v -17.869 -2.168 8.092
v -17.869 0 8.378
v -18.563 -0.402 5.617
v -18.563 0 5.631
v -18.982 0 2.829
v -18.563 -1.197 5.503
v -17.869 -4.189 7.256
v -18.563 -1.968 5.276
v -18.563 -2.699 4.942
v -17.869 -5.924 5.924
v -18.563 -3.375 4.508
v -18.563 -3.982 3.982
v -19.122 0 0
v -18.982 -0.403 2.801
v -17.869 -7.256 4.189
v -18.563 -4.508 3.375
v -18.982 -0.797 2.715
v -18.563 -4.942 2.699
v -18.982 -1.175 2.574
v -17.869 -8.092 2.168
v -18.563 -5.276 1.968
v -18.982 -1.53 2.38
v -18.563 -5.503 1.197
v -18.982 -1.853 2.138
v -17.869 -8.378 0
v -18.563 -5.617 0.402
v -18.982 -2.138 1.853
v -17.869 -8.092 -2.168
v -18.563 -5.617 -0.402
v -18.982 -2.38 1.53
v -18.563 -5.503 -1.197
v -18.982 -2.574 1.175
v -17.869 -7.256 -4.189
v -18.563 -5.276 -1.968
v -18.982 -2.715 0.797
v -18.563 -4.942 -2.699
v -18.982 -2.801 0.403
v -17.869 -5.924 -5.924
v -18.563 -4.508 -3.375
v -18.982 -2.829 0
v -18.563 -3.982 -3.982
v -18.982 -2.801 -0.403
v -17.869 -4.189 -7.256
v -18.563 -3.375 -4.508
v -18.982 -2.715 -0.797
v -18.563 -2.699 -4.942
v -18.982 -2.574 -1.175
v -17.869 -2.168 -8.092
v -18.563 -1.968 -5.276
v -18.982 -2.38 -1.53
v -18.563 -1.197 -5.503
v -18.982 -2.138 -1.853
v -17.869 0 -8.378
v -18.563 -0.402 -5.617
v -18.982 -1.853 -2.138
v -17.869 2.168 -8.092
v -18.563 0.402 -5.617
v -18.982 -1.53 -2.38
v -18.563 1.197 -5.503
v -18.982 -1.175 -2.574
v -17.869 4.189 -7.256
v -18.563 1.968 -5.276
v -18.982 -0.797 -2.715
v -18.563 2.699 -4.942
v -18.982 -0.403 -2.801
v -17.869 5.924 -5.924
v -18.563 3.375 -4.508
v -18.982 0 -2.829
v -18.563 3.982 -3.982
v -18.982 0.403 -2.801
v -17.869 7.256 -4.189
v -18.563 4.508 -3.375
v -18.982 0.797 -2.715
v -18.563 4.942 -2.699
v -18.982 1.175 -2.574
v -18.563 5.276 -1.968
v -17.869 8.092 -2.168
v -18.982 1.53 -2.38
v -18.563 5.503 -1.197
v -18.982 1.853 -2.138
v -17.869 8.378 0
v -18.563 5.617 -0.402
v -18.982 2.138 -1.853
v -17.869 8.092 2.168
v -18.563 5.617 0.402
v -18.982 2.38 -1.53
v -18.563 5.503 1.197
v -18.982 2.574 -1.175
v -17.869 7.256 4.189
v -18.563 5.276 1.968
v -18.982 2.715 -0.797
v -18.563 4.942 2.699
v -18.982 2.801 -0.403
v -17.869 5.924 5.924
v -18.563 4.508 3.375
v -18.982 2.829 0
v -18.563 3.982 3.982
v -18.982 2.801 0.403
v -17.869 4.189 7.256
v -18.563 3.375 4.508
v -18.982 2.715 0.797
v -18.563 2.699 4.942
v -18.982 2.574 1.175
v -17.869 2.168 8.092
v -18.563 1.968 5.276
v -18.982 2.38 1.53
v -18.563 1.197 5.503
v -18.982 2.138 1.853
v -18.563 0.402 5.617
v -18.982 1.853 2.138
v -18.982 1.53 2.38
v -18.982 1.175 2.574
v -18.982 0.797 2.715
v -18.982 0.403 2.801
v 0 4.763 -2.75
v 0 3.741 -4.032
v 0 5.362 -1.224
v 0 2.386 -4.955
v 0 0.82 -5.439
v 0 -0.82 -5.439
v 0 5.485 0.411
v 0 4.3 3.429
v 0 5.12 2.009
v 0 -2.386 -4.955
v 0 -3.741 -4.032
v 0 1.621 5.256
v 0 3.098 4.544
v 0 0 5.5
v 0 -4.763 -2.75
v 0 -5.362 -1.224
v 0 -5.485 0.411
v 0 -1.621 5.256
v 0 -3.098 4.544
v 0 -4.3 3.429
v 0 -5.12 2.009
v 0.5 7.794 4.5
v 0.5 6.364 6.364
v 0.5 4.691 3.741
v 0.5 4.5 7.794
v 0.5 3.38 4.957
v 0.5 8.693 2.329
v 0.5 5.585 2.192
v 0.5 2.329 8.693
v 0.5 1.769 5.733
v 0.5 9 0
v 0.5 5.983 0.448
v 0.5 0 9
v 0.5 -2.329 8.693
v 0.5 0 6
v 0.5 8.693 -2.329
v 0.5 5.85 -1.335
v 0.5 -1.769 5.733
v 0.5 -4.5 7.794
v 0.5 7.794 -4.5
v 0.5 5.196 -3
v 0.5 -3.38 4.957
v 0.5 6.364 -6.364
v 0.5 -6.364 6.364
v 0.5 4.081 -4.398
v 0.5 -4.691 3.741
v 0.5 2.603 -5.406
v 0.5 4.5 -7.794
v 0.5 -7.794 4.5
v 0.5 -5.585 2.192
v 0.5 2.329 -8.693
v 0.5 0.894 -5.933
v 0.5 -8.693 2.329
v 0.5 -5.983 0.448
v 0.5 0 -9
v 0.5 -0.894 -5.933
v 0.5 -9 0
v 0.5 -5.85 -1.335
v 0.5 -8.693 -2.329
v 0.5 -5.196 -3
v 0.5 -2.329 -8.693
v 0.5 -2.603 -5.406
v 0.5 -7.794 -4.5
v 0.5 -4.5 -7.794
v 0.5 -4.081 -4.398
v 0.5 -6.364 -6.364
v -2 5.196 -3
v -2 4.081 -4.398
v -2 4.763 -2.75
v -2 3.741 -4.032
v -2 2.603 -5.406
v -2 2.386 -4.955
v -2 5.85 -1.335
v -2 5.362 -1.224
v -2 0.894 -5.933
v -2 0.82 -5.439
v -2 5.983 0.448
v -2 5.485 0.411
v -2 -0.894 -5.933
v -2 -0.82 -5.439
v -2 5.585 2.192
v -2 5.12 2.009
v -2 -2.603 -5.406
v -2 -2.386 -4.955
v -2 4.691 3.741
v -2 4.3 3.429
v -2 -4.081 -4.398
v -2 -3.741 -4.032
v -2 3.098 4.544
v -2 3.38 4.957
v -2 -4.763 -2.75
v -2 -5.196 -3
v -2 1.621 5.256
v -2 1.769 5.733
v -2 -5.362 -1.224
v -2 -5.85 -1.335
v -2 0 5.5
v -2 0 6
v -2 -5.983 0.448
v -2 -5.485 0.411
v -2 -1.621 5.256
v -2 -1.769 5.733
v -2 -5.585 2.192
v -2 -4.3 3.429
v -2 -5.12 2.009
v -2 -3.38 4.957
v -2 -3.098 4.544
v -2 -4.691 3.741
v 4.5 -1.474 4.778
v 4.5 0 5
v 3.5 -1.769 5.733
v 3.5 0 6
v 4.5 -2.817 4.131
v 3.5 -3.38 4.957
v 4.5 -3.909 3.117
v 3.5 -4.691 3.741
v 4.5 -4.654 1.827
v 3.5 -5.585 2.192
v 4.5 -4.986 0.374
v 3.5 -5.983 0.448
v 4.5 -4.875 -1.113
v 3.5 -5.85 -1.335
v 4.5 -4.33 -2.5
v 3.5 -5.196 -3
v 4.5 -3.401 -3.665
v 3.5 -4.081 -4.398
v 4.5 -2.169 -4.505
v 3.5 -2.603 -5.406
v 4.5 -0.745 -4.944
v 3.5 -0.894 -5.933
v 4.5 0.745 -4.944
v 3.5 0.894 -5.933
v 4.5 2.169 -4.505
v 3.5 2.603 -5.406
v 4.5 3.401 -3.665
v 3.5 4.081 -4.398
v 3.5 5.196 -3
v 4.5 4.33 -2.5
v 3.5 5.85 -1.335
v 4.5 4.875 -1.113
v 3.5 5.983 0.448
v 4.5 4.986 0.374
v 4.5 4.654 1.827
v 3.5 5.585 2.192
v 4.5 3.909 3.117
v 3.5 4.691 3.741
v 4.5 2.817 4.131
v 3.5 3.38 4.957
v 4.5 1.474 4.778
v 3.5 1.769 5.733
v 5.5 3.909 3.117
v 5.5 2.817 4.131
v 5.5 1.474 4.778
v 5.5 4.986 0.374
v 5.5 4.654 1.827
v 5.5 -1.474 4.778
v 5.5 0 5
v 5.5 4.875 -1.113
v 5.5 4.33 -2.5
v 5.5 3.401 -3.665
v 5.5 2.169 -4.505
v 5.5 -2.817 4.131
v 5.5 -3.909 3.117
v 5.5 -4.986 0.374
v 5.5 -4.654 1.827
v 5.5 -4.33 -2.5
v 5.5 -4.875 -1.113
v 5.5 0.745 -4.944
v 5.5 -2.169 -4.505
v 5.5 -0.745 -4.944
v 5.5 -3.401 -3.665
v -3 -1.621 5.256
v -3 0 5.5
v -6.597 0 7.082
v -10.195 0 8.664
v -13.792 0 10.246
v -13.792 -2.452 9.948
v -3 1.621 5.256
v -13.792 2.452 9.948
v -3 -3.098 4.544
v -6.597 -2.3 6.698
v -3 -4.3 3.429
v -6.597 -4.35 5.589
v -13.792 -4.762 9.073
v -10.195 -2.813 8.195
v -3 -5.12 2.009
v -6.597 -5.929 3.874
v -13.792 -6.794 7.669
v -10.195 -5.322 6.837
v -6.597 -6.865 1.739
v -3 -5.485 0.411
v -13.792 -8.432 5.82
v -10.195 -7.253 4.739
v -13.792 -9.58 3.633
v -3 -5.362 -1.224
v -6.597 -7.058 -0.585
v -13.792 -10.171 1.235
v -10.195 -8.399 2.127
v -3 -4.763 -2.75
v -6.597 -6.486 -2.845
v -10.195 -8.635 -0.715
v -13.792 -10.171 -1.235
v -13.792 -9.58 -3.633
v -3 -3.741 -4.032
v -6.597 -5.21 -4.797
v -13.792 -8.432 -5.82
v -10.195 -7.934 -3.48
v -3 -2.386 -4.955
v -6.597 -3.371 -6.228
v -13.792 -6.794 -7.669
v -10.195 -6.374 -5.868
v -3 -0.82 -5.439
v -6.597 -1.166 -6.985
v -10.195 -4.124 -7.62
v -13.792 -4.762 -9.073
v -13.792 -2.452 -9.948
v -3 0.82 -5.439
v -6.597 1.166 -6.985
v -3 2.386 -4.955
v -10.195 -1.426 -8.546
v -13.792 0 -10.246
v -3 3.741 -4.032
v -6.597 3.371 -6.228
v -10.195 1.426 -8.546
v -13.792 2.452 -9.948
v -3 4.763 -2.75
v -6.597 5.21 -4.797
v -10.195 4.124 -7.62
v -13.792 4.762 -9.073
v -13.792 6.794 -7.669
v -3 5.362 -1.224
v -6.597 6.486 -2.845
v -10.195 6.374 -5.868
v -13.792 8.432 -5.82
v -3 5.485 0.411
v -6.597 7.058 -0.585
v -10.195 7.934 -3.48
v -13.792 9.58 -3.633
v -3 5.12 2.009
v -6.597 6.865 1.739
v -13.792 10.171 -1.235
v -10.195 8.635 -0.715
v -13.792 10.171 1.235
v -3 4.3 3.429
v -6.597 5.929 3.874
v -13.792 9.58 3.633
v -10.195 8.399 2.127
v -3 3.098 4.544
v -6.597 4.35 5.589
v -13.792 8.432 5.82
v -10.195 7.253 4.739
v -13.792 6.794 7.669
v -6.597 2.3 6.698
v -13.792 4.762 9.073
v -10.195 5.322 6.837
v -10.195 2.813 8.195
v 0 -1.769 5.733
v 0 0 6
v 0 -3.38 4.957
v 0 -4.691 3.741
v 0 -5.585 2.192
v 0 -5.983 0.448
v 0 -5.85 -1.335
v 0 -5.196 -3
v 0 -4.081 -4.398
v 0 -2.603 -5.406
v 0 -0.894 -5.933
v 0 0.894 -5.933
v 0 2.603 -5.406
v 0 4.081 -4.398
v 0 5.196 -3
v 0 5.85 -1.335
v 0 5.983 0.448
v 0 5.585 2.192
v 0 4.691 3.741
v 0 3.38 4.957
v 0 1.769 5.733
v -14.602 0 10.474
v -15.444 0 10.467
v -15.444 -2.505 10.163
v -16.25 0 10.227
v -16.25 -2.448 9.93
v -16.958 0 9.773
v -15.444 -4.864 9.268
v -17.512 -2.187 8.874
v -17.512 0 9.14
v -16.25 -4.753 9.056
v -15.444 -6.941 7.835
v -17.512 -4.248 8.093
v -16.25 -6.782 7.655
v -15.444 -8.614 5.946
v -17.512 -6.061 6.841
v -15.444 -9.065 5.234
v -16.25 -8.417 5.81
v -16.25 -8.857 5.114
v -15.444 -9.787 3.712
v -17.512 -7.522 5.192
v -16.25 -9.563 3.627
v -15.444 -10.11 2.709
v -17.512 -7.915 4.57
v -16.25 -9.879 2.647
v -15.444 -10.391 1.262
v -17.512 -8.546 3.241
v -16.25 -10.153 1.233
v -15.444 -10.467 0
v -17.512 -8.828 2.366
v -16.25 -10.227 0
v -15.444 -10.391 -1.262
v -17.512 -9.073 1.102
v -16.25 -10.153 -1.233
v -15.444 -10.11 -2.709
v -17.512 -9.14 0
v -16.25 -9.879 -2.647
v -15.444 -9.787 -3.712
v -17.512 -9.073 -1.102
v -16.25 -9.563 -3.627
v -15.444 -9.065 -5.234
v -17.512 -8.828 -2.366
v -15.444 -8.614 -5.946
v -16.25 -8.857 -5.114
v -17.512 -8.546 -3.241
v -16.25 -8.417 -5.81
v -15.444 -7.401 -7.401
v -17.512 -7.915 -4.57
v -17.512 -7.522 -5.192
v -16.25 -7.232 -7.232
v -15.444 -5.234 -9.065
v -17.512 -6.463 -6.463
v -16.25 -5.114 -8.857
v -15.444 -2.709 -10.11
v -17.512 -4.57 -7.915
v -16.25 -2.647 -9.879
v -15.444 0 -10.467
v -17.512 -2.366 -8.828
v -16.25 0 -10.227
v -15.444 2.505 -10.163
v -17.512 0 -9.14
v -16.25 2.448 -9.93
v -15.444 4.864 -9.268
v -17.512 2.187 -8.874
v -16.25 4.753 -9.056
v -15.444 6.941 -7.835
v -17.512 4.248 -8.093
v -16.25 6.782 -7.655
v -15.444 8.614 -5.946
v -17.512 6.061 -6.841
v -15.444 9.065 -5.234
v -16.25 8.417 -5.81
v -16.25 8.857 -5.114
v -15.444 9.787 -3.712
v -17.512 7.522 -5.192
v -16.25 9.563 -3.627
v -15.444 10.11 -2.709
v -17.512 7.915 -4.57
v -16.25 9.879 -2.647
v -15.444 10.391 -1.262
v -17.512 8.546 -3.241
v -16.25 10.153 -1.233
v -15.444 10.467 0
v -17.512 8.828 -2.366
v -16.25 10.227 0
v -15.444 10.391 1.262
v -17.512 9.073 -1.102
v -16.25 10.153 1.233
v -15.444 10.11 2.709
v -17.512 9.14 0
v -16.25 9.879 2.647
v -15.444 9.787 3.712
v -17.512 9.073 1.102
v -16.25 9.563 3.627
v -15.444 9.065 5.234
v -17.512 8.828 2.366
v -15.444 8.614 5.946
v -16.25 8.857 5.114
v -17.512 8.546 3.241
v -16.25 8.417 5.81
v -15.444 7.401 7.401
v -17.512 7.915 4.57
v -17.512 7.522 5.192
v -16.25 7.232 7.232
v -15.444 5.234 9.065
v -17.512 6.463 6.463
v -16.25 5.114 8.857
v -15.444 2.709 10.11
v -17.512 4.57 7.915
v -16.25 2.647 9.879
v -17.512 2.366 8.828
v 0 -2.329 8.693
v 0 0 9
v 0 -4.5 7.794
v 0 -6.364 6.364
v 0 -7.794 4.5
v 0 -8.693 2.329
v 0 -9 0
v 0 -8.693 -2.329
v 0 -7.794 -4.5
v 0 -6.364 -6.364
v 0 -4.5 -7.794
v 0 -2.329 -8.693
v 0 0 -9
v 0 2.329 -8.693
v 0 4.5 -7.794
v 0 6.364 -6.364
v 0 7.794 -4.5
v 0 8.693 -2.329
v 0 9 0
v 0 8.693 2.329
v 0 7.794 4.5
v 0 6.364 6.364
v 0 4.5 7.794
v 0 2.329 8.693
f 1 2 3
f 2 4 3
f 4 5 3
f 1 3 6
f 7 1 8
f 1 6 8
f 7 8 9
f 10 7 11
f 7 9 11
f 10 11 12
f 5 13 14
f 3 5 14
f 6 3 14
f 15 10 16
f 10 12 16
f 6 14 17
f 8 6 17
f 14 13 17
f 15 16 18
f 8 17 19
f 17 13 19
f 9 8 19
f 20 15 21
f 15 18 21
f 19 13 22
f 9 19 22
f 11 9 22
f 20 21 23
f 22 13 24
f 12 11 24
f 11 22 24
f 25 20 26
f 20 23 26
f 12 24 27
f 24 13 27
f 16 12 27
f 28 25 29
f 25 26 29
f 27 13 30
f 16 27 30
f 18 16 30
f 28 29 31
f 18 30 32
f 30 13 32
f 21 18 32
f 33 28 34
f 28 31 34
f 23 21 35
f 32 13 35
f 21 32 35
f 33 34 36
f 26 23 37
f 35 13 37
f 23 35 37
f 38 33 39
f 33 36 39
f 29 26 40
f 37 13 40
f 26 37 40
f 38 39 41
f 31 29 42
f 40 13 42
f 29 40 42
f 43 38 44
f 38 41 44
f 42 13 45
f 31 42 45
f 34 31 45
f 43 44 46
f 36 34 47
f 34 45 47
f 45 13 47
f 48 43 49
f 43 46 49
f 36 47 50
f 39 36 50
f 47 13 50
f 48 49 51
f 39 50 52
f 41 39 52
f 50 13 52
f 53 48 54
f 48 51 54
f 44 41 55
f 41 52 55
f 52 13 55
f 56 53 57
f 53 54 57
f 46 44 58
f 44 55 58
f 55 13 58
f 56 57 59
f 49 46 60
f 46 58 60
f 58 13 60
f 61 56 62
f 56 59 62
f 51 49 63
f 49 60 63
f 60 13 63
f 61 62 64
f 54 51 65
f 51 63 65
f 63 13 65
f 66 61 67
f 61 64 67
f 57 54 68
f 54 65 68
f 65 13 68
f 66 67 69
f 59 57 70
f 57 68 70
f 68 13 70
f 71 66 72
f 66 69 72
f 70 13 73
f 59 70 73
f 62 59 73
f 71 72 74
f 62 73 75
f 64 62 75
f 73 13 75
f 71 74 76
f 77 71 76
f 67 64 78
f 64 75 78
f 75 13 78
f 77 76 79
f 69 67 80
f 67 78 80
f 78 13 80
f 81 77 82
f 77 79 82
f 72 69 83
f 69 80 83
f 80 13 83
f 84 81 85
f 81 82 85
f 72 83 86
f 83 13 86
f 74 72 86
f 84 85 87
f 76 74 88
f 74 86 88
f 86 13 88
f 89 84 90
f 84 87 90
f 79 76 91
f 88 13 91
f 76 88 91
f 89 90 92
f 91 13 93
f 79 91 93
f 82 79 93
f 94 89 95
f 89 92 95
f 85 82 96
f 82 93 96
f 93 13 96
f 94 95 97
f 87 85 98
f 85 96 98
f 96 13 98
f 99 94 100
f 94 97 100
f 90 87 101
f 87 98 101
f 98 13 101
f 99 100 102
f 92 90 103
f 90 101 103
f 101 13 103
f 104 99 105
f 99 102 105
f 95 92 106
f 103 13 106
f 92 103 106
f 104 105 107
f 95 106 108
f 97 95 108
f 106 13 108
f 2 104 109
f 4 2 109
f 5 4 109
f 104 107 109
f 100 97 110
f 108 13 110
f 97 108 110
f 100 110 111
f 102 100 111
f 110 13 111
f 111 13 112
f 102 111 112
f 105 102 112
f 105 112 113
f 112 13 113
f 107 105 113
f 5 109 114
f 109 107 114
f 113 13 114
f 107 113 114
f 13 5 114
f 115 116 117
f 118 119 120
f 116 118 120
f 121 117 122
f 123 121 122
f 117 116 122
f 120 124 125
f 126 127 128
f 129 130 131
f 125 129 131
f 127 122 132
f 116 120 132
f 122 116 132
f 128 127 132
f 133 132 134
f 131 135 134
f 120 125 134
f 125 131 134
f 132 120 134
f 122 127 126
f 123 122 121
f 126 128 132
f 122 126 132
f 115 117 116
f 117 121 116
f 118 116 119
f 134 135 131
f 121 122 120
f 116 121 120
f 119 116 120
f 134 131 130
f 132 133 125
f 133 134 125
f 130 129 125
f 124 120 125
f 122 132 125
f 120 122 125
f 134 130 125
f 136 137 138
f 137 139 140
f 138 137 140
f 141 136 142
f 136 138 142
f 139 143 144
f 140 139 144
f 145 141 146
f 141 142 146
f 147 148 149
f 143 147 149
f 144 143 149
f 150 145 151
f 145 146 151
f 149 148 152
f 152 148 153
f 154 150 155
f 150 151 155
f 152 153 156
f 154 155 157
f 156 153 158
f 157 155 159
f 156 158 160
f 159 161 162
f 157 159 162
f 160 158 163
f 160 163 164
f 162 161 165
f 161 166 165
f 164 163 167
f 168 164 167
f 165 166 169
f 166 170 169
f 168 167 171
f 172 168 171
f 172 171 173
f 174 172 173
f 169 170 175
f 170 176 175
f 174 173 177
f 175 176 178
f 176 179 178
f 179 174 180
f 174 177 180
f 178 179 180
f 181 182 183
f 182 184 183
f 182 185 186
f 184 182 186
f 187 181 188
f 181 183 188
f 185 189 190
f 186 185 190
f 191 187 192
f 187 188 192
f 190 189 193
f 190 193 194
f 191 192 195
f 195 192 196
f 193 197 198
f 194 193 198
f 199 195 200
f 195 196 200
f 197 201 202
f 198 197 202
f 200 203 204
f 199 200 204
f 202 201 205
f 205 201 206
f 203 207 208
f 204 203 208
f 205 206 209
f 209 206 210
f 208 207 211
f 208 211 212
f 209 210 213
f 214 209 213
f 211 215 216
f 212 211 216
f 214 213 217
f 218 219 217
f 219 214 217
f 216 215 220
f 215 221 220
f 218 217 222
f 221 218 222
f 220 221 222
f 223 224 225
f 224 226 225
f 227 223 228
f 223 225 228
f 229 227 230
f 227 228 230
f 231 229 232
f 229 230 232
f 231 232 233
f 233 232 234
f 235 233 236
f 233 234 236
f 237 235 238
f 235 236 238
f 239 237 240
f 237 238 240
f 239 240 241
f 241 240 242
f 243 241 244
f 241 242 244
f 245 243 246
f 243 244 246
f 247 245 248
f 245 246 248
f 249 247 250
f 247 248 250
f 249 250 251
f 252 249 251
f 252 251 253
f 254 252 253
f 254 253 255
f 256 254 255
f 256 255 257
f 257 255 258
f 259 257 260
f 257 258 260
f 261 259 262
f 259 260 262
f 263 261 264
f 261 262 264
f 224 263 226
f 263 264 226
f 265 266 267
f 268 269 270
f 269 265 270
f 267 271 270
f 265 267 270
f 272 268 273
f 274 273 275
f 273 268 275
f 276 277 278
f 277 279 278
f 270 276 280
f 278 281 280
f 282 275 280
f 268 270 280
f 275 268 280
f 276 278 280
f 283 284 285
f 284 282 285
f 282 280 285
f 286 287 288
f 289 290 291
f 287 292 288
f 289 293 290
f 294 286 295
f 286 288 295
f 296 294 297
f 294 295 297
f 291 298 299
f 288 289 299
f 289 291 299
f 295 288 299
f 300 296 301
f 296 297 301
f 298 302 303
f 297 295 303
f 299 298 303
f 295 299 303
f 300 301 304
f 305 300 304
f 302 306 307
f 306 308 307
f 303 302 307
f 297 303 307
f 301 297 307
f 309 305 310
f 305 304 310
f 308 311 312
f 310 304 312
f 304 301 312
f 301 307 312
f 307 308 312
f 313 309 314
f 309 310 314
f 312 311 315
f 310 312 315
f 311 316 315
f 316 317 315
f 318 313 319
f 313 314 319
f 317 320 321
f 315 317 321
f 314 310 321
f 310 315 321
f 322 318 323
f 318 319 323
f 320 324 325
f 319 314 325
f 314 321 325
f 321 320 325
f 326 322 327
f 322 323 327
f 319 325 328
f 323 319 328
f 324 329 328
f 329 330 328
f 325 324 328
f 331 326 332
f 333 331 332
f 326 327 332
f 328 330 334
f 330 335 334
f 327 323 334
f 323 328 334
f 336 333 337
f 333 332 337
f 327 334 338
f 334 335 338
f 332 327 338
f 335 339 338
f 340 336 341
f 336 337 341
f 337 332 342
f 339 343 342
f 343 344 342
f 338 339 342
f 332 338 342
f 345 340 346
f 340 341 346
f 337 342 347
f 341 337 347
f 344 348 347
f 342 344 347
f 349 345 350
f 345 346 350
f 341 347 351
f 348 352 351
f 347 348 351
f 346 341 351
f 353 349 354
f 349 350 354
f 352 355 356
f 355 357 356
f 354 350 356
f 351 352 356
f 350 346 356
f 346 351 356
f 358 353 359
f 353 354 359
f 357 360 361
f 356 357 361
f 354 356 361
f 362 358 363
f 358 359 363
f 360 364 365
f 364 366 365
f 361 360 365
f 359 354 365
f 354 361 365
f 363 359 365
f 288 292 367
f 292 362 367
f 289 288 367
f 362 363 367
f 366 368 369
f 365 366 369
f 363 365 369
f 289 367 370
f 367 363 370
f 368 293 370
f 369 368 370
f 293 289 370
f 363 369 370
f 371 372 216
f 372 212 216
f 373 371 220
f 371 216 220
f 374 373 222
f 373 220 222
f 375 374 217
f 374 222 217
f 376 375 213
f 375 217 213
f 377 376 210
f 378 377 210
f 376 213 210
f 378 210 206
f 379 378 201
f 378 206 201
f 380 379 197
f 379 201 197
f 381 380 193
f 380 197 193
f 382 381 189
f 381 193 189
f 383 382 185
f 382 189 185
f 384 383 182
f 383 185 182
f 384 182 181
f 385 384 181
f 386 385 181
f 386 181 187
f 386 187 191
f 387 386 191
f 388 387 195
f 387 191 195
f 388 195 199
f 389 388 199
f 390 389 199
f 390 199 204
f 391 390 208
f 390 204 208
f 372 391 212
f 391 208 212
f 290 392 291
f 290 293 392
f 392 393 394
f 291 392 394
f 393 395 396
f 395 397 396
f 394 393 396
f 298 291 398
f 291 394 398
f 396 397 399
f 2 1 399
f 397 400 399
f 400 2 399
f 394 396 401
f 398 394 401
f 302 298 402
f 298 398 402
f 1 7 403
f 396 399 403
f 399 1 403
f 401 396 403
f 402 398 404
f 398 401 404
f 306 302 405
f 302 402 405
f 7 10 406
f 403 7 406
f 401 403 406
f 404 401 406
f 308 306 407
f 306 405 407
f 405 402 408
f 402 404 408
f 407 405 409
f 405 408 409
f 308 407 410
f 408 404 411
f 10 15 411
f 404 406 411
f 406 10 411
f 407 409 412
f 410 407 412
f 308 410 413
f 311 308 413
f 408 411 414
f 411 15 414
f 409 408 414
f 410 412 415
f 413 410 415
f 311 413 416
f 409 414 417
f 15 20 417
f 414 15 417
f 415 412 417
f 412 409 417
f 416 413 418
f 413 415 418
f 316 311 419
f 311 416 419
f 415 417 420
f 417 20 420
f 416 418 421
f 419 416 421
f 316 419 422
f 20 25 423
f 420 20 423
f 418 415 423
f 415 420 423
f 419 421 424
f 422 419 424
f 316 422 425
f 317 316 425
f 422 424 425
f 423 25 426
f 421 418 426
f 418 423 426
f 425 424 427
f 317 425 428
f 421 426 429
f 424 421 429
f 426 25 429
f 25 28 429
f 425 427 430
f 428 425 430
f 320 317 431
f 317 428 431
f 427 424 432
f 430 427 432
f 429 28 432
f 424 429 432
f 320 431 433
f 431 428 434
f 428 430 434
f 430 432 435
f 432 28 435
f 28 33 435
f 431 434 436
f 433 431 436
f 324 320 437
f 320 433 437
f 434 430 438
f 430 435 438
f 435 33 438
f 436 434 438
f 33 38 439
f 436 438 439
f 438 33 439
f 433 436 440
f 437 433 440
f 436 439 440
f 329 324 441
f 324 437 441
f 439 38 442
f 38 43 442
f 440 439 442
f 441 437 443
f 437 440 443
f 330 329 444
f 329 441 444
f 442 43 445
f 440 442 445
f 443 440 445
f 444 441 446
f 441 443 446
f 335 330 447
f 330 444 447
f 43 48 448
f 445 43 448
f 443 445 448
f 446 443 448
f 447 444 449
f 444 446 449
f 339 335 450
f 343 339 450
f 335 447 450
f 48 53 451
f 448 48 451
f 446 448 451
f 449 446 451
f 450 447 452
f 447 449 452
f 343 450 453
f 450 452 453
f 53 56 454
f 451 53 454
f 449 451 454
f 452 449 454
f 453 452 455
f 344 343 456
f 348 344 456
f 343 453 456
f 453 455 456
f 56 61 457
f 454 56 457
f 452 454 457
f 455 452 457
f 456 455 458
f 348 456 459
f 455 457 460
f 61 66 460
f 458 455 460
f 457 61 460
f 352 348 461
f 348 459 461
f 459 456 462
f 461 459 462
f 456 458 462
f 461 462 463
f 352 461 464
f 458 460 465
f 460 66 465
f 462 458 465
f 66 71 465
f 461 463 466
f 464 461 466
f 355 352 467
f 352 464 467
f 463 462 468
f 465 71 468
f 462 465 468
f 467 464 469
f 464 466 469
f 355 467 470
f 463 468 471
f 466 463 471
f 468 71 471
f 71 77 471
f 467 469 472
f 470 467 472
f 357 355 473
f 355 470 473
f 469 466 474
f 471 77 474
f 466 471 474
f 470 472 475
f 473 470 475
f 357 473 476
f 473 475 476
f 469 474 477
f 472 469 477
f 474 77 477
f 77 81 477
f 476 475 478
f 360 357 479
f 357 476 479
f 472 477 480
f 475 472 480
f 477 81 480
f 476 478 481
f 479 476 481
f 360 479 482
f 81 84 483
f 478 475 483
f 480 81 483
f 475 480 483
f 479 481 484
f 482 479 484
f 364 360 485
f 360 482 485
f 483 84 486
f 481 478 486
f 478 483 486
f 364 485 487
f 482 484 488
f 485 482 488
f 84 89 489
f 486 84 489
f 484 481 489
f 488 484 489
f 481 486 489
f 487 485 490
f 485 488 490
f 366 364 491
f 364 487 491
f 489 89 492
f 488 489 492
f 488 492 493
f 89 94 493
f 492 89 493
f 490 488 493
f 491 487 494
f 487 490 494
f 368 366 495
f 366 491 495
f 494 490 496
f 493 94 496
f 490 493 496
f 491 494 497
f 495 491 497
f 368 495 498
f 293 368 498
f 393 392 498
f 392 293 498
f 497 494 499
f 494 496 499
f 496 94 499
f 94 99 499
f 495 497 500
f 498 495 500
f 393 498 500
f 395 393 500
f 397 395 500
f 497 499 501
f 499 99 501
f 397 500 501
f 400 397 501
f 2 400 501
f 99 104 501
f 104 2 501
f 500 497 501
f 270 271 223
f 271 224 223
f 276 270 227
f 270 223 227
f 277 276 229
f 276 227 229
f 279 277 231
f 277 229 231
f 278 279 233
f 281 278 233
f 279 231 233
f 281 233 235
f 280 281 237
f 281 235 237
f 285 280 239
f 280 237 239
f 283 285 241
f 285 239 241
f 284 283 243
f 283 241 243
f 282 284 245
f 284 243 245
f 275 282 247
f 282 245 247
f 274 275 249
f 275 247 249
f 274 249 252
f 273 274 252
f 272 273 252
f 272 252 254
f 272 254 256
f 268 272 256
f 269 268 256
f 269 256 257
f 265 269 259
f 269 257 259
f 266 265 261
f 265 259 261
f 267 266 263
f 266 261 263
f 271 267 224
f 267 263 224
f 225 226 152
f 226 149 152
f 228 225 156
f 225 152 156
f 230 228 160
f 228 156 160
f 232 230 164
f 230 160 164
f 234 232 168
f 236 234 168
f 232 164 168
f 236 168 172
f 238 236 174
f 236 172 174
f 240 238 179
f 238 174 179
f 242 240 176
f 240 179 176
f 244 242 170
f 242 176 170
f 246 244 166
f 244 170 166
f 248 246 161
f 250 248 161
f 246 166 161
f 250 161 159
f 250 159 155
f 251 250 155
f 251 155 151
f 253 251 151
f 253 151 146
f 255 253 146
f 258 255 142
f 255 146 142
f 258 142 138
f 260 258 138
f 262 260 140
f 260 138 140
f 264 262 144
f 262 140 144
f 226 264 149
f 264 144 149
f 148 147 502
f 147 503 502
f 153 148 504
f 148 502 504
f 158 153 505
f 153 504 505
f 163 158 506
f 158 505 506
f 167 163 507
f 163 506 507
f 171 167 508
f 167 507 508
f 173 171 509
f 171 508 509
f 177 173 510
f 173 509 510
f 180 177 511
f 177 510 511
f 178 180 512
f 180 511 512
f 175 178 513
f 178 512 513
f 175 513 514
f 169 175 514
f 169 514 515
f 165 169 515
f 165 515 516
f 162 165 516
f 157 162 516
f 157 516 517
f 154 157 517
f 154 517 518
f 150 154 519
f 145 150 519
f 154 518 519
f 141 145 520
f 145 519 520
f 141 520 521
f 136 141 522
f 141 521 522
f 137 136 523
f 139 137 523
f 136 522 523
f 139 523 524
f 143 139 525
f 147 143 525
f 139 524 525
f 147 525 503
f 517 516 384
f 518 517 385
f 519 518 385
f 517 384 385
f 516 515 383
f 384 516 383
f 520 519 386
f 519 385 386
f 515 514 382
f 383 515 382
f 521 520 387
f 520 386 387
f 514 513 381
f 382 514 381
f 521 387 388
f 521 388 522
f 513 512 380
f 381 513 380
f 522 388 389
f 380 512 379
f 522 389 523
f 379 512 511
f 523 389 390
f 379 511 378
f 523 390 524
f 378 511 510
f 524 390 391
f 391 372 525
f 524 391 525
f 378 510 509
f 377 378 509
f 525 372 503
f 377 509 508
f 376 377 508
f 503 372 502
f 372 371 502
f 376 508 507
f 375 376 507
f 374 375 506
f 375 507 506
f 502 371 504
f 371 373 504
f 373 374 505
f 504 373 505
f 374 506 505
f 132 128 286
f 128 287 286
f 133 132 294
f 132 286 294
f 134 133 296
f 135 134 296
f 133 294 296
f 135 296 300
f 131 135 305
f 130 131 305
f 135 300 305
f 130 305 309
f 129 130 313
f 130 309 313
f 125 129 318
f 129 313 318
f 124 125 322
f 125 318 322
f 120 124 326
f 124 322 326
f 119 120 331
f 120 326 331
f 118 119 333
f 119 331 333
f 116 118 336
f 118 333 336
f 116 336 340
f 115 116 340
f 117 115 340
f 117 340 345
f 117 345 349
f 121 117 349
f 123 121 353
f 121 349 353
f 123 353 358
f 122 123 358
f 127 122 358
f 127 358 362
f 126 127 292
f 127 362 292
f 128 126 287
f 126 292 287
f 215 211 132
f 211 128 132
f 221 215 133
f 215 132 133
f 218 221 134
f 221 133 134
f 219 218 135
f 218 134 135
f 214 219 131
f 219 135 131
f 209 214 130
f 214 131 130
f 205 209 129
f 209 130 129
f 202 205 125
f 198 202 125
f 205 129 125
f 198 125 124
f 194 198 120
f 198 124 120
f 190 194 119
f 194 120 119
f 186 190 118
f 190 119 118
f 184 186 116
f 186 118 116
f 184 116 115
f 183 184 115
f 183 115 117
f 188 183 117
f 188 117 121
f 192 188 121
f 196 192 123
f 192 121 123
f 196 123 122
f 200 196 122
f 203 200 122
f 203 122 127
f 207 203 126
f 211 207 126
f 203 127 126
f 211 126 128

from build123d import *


with BuildPart() as part:
    # Sketch2 → Revolve1 (revolve)
    with BuildSketch(Plane.XY, mode=Mode.PRIVATE) as revolve1_sk:
        Polygon((0, 0), (5.5, 0), (5.5, 5), (4.5, 5), (3.5, 6), (0.5, 6), (0.5, 9), (0, 9), (0, 6), (-2, 6), (-2, 5.5), (0, 5.5), align=None)
    revolve(revolve1_sk.sketch.rotate(Axis((0, 0, 0), (1, 0, 0)), 90), axis=Axis((0, 0, 0), (1, 0, 0)))


with BuildPart() as body_2:
    # Sketch3 → Revolve2 (revolve)
    with BuildSketch(Plane.XY, mode=Mode.PRIVATE) as revolve2_sk:
        with BuildLine():
            Line((0, 5.5), (-3, 5.5))
            Line((-3, 5.5), (-13.792304346, 10.246173922))
            ThreePointArc((-13.792304346, 10.246173922), (-16.249914373, 10.227217274), (-17.868664312, 8.377932268))
            ThreePointArc((-17.868664312, 8.377932268), (-18.806913336, 4.235579525), (-19.121974552, 0))
            Line((-19.121974552, 0), (0, 0))
            Line((0, 0), (0, 5.5))
        make_face()
    revolve(revolve2_sk.sketch.rotate(Axis((-19.121974552, 0, 0), (1, 0, 0)), 90), axis=Axis((-19.121974552, 0, 0), (1, 0, 0)))


solid = Compound([part.part, body_2.part])
